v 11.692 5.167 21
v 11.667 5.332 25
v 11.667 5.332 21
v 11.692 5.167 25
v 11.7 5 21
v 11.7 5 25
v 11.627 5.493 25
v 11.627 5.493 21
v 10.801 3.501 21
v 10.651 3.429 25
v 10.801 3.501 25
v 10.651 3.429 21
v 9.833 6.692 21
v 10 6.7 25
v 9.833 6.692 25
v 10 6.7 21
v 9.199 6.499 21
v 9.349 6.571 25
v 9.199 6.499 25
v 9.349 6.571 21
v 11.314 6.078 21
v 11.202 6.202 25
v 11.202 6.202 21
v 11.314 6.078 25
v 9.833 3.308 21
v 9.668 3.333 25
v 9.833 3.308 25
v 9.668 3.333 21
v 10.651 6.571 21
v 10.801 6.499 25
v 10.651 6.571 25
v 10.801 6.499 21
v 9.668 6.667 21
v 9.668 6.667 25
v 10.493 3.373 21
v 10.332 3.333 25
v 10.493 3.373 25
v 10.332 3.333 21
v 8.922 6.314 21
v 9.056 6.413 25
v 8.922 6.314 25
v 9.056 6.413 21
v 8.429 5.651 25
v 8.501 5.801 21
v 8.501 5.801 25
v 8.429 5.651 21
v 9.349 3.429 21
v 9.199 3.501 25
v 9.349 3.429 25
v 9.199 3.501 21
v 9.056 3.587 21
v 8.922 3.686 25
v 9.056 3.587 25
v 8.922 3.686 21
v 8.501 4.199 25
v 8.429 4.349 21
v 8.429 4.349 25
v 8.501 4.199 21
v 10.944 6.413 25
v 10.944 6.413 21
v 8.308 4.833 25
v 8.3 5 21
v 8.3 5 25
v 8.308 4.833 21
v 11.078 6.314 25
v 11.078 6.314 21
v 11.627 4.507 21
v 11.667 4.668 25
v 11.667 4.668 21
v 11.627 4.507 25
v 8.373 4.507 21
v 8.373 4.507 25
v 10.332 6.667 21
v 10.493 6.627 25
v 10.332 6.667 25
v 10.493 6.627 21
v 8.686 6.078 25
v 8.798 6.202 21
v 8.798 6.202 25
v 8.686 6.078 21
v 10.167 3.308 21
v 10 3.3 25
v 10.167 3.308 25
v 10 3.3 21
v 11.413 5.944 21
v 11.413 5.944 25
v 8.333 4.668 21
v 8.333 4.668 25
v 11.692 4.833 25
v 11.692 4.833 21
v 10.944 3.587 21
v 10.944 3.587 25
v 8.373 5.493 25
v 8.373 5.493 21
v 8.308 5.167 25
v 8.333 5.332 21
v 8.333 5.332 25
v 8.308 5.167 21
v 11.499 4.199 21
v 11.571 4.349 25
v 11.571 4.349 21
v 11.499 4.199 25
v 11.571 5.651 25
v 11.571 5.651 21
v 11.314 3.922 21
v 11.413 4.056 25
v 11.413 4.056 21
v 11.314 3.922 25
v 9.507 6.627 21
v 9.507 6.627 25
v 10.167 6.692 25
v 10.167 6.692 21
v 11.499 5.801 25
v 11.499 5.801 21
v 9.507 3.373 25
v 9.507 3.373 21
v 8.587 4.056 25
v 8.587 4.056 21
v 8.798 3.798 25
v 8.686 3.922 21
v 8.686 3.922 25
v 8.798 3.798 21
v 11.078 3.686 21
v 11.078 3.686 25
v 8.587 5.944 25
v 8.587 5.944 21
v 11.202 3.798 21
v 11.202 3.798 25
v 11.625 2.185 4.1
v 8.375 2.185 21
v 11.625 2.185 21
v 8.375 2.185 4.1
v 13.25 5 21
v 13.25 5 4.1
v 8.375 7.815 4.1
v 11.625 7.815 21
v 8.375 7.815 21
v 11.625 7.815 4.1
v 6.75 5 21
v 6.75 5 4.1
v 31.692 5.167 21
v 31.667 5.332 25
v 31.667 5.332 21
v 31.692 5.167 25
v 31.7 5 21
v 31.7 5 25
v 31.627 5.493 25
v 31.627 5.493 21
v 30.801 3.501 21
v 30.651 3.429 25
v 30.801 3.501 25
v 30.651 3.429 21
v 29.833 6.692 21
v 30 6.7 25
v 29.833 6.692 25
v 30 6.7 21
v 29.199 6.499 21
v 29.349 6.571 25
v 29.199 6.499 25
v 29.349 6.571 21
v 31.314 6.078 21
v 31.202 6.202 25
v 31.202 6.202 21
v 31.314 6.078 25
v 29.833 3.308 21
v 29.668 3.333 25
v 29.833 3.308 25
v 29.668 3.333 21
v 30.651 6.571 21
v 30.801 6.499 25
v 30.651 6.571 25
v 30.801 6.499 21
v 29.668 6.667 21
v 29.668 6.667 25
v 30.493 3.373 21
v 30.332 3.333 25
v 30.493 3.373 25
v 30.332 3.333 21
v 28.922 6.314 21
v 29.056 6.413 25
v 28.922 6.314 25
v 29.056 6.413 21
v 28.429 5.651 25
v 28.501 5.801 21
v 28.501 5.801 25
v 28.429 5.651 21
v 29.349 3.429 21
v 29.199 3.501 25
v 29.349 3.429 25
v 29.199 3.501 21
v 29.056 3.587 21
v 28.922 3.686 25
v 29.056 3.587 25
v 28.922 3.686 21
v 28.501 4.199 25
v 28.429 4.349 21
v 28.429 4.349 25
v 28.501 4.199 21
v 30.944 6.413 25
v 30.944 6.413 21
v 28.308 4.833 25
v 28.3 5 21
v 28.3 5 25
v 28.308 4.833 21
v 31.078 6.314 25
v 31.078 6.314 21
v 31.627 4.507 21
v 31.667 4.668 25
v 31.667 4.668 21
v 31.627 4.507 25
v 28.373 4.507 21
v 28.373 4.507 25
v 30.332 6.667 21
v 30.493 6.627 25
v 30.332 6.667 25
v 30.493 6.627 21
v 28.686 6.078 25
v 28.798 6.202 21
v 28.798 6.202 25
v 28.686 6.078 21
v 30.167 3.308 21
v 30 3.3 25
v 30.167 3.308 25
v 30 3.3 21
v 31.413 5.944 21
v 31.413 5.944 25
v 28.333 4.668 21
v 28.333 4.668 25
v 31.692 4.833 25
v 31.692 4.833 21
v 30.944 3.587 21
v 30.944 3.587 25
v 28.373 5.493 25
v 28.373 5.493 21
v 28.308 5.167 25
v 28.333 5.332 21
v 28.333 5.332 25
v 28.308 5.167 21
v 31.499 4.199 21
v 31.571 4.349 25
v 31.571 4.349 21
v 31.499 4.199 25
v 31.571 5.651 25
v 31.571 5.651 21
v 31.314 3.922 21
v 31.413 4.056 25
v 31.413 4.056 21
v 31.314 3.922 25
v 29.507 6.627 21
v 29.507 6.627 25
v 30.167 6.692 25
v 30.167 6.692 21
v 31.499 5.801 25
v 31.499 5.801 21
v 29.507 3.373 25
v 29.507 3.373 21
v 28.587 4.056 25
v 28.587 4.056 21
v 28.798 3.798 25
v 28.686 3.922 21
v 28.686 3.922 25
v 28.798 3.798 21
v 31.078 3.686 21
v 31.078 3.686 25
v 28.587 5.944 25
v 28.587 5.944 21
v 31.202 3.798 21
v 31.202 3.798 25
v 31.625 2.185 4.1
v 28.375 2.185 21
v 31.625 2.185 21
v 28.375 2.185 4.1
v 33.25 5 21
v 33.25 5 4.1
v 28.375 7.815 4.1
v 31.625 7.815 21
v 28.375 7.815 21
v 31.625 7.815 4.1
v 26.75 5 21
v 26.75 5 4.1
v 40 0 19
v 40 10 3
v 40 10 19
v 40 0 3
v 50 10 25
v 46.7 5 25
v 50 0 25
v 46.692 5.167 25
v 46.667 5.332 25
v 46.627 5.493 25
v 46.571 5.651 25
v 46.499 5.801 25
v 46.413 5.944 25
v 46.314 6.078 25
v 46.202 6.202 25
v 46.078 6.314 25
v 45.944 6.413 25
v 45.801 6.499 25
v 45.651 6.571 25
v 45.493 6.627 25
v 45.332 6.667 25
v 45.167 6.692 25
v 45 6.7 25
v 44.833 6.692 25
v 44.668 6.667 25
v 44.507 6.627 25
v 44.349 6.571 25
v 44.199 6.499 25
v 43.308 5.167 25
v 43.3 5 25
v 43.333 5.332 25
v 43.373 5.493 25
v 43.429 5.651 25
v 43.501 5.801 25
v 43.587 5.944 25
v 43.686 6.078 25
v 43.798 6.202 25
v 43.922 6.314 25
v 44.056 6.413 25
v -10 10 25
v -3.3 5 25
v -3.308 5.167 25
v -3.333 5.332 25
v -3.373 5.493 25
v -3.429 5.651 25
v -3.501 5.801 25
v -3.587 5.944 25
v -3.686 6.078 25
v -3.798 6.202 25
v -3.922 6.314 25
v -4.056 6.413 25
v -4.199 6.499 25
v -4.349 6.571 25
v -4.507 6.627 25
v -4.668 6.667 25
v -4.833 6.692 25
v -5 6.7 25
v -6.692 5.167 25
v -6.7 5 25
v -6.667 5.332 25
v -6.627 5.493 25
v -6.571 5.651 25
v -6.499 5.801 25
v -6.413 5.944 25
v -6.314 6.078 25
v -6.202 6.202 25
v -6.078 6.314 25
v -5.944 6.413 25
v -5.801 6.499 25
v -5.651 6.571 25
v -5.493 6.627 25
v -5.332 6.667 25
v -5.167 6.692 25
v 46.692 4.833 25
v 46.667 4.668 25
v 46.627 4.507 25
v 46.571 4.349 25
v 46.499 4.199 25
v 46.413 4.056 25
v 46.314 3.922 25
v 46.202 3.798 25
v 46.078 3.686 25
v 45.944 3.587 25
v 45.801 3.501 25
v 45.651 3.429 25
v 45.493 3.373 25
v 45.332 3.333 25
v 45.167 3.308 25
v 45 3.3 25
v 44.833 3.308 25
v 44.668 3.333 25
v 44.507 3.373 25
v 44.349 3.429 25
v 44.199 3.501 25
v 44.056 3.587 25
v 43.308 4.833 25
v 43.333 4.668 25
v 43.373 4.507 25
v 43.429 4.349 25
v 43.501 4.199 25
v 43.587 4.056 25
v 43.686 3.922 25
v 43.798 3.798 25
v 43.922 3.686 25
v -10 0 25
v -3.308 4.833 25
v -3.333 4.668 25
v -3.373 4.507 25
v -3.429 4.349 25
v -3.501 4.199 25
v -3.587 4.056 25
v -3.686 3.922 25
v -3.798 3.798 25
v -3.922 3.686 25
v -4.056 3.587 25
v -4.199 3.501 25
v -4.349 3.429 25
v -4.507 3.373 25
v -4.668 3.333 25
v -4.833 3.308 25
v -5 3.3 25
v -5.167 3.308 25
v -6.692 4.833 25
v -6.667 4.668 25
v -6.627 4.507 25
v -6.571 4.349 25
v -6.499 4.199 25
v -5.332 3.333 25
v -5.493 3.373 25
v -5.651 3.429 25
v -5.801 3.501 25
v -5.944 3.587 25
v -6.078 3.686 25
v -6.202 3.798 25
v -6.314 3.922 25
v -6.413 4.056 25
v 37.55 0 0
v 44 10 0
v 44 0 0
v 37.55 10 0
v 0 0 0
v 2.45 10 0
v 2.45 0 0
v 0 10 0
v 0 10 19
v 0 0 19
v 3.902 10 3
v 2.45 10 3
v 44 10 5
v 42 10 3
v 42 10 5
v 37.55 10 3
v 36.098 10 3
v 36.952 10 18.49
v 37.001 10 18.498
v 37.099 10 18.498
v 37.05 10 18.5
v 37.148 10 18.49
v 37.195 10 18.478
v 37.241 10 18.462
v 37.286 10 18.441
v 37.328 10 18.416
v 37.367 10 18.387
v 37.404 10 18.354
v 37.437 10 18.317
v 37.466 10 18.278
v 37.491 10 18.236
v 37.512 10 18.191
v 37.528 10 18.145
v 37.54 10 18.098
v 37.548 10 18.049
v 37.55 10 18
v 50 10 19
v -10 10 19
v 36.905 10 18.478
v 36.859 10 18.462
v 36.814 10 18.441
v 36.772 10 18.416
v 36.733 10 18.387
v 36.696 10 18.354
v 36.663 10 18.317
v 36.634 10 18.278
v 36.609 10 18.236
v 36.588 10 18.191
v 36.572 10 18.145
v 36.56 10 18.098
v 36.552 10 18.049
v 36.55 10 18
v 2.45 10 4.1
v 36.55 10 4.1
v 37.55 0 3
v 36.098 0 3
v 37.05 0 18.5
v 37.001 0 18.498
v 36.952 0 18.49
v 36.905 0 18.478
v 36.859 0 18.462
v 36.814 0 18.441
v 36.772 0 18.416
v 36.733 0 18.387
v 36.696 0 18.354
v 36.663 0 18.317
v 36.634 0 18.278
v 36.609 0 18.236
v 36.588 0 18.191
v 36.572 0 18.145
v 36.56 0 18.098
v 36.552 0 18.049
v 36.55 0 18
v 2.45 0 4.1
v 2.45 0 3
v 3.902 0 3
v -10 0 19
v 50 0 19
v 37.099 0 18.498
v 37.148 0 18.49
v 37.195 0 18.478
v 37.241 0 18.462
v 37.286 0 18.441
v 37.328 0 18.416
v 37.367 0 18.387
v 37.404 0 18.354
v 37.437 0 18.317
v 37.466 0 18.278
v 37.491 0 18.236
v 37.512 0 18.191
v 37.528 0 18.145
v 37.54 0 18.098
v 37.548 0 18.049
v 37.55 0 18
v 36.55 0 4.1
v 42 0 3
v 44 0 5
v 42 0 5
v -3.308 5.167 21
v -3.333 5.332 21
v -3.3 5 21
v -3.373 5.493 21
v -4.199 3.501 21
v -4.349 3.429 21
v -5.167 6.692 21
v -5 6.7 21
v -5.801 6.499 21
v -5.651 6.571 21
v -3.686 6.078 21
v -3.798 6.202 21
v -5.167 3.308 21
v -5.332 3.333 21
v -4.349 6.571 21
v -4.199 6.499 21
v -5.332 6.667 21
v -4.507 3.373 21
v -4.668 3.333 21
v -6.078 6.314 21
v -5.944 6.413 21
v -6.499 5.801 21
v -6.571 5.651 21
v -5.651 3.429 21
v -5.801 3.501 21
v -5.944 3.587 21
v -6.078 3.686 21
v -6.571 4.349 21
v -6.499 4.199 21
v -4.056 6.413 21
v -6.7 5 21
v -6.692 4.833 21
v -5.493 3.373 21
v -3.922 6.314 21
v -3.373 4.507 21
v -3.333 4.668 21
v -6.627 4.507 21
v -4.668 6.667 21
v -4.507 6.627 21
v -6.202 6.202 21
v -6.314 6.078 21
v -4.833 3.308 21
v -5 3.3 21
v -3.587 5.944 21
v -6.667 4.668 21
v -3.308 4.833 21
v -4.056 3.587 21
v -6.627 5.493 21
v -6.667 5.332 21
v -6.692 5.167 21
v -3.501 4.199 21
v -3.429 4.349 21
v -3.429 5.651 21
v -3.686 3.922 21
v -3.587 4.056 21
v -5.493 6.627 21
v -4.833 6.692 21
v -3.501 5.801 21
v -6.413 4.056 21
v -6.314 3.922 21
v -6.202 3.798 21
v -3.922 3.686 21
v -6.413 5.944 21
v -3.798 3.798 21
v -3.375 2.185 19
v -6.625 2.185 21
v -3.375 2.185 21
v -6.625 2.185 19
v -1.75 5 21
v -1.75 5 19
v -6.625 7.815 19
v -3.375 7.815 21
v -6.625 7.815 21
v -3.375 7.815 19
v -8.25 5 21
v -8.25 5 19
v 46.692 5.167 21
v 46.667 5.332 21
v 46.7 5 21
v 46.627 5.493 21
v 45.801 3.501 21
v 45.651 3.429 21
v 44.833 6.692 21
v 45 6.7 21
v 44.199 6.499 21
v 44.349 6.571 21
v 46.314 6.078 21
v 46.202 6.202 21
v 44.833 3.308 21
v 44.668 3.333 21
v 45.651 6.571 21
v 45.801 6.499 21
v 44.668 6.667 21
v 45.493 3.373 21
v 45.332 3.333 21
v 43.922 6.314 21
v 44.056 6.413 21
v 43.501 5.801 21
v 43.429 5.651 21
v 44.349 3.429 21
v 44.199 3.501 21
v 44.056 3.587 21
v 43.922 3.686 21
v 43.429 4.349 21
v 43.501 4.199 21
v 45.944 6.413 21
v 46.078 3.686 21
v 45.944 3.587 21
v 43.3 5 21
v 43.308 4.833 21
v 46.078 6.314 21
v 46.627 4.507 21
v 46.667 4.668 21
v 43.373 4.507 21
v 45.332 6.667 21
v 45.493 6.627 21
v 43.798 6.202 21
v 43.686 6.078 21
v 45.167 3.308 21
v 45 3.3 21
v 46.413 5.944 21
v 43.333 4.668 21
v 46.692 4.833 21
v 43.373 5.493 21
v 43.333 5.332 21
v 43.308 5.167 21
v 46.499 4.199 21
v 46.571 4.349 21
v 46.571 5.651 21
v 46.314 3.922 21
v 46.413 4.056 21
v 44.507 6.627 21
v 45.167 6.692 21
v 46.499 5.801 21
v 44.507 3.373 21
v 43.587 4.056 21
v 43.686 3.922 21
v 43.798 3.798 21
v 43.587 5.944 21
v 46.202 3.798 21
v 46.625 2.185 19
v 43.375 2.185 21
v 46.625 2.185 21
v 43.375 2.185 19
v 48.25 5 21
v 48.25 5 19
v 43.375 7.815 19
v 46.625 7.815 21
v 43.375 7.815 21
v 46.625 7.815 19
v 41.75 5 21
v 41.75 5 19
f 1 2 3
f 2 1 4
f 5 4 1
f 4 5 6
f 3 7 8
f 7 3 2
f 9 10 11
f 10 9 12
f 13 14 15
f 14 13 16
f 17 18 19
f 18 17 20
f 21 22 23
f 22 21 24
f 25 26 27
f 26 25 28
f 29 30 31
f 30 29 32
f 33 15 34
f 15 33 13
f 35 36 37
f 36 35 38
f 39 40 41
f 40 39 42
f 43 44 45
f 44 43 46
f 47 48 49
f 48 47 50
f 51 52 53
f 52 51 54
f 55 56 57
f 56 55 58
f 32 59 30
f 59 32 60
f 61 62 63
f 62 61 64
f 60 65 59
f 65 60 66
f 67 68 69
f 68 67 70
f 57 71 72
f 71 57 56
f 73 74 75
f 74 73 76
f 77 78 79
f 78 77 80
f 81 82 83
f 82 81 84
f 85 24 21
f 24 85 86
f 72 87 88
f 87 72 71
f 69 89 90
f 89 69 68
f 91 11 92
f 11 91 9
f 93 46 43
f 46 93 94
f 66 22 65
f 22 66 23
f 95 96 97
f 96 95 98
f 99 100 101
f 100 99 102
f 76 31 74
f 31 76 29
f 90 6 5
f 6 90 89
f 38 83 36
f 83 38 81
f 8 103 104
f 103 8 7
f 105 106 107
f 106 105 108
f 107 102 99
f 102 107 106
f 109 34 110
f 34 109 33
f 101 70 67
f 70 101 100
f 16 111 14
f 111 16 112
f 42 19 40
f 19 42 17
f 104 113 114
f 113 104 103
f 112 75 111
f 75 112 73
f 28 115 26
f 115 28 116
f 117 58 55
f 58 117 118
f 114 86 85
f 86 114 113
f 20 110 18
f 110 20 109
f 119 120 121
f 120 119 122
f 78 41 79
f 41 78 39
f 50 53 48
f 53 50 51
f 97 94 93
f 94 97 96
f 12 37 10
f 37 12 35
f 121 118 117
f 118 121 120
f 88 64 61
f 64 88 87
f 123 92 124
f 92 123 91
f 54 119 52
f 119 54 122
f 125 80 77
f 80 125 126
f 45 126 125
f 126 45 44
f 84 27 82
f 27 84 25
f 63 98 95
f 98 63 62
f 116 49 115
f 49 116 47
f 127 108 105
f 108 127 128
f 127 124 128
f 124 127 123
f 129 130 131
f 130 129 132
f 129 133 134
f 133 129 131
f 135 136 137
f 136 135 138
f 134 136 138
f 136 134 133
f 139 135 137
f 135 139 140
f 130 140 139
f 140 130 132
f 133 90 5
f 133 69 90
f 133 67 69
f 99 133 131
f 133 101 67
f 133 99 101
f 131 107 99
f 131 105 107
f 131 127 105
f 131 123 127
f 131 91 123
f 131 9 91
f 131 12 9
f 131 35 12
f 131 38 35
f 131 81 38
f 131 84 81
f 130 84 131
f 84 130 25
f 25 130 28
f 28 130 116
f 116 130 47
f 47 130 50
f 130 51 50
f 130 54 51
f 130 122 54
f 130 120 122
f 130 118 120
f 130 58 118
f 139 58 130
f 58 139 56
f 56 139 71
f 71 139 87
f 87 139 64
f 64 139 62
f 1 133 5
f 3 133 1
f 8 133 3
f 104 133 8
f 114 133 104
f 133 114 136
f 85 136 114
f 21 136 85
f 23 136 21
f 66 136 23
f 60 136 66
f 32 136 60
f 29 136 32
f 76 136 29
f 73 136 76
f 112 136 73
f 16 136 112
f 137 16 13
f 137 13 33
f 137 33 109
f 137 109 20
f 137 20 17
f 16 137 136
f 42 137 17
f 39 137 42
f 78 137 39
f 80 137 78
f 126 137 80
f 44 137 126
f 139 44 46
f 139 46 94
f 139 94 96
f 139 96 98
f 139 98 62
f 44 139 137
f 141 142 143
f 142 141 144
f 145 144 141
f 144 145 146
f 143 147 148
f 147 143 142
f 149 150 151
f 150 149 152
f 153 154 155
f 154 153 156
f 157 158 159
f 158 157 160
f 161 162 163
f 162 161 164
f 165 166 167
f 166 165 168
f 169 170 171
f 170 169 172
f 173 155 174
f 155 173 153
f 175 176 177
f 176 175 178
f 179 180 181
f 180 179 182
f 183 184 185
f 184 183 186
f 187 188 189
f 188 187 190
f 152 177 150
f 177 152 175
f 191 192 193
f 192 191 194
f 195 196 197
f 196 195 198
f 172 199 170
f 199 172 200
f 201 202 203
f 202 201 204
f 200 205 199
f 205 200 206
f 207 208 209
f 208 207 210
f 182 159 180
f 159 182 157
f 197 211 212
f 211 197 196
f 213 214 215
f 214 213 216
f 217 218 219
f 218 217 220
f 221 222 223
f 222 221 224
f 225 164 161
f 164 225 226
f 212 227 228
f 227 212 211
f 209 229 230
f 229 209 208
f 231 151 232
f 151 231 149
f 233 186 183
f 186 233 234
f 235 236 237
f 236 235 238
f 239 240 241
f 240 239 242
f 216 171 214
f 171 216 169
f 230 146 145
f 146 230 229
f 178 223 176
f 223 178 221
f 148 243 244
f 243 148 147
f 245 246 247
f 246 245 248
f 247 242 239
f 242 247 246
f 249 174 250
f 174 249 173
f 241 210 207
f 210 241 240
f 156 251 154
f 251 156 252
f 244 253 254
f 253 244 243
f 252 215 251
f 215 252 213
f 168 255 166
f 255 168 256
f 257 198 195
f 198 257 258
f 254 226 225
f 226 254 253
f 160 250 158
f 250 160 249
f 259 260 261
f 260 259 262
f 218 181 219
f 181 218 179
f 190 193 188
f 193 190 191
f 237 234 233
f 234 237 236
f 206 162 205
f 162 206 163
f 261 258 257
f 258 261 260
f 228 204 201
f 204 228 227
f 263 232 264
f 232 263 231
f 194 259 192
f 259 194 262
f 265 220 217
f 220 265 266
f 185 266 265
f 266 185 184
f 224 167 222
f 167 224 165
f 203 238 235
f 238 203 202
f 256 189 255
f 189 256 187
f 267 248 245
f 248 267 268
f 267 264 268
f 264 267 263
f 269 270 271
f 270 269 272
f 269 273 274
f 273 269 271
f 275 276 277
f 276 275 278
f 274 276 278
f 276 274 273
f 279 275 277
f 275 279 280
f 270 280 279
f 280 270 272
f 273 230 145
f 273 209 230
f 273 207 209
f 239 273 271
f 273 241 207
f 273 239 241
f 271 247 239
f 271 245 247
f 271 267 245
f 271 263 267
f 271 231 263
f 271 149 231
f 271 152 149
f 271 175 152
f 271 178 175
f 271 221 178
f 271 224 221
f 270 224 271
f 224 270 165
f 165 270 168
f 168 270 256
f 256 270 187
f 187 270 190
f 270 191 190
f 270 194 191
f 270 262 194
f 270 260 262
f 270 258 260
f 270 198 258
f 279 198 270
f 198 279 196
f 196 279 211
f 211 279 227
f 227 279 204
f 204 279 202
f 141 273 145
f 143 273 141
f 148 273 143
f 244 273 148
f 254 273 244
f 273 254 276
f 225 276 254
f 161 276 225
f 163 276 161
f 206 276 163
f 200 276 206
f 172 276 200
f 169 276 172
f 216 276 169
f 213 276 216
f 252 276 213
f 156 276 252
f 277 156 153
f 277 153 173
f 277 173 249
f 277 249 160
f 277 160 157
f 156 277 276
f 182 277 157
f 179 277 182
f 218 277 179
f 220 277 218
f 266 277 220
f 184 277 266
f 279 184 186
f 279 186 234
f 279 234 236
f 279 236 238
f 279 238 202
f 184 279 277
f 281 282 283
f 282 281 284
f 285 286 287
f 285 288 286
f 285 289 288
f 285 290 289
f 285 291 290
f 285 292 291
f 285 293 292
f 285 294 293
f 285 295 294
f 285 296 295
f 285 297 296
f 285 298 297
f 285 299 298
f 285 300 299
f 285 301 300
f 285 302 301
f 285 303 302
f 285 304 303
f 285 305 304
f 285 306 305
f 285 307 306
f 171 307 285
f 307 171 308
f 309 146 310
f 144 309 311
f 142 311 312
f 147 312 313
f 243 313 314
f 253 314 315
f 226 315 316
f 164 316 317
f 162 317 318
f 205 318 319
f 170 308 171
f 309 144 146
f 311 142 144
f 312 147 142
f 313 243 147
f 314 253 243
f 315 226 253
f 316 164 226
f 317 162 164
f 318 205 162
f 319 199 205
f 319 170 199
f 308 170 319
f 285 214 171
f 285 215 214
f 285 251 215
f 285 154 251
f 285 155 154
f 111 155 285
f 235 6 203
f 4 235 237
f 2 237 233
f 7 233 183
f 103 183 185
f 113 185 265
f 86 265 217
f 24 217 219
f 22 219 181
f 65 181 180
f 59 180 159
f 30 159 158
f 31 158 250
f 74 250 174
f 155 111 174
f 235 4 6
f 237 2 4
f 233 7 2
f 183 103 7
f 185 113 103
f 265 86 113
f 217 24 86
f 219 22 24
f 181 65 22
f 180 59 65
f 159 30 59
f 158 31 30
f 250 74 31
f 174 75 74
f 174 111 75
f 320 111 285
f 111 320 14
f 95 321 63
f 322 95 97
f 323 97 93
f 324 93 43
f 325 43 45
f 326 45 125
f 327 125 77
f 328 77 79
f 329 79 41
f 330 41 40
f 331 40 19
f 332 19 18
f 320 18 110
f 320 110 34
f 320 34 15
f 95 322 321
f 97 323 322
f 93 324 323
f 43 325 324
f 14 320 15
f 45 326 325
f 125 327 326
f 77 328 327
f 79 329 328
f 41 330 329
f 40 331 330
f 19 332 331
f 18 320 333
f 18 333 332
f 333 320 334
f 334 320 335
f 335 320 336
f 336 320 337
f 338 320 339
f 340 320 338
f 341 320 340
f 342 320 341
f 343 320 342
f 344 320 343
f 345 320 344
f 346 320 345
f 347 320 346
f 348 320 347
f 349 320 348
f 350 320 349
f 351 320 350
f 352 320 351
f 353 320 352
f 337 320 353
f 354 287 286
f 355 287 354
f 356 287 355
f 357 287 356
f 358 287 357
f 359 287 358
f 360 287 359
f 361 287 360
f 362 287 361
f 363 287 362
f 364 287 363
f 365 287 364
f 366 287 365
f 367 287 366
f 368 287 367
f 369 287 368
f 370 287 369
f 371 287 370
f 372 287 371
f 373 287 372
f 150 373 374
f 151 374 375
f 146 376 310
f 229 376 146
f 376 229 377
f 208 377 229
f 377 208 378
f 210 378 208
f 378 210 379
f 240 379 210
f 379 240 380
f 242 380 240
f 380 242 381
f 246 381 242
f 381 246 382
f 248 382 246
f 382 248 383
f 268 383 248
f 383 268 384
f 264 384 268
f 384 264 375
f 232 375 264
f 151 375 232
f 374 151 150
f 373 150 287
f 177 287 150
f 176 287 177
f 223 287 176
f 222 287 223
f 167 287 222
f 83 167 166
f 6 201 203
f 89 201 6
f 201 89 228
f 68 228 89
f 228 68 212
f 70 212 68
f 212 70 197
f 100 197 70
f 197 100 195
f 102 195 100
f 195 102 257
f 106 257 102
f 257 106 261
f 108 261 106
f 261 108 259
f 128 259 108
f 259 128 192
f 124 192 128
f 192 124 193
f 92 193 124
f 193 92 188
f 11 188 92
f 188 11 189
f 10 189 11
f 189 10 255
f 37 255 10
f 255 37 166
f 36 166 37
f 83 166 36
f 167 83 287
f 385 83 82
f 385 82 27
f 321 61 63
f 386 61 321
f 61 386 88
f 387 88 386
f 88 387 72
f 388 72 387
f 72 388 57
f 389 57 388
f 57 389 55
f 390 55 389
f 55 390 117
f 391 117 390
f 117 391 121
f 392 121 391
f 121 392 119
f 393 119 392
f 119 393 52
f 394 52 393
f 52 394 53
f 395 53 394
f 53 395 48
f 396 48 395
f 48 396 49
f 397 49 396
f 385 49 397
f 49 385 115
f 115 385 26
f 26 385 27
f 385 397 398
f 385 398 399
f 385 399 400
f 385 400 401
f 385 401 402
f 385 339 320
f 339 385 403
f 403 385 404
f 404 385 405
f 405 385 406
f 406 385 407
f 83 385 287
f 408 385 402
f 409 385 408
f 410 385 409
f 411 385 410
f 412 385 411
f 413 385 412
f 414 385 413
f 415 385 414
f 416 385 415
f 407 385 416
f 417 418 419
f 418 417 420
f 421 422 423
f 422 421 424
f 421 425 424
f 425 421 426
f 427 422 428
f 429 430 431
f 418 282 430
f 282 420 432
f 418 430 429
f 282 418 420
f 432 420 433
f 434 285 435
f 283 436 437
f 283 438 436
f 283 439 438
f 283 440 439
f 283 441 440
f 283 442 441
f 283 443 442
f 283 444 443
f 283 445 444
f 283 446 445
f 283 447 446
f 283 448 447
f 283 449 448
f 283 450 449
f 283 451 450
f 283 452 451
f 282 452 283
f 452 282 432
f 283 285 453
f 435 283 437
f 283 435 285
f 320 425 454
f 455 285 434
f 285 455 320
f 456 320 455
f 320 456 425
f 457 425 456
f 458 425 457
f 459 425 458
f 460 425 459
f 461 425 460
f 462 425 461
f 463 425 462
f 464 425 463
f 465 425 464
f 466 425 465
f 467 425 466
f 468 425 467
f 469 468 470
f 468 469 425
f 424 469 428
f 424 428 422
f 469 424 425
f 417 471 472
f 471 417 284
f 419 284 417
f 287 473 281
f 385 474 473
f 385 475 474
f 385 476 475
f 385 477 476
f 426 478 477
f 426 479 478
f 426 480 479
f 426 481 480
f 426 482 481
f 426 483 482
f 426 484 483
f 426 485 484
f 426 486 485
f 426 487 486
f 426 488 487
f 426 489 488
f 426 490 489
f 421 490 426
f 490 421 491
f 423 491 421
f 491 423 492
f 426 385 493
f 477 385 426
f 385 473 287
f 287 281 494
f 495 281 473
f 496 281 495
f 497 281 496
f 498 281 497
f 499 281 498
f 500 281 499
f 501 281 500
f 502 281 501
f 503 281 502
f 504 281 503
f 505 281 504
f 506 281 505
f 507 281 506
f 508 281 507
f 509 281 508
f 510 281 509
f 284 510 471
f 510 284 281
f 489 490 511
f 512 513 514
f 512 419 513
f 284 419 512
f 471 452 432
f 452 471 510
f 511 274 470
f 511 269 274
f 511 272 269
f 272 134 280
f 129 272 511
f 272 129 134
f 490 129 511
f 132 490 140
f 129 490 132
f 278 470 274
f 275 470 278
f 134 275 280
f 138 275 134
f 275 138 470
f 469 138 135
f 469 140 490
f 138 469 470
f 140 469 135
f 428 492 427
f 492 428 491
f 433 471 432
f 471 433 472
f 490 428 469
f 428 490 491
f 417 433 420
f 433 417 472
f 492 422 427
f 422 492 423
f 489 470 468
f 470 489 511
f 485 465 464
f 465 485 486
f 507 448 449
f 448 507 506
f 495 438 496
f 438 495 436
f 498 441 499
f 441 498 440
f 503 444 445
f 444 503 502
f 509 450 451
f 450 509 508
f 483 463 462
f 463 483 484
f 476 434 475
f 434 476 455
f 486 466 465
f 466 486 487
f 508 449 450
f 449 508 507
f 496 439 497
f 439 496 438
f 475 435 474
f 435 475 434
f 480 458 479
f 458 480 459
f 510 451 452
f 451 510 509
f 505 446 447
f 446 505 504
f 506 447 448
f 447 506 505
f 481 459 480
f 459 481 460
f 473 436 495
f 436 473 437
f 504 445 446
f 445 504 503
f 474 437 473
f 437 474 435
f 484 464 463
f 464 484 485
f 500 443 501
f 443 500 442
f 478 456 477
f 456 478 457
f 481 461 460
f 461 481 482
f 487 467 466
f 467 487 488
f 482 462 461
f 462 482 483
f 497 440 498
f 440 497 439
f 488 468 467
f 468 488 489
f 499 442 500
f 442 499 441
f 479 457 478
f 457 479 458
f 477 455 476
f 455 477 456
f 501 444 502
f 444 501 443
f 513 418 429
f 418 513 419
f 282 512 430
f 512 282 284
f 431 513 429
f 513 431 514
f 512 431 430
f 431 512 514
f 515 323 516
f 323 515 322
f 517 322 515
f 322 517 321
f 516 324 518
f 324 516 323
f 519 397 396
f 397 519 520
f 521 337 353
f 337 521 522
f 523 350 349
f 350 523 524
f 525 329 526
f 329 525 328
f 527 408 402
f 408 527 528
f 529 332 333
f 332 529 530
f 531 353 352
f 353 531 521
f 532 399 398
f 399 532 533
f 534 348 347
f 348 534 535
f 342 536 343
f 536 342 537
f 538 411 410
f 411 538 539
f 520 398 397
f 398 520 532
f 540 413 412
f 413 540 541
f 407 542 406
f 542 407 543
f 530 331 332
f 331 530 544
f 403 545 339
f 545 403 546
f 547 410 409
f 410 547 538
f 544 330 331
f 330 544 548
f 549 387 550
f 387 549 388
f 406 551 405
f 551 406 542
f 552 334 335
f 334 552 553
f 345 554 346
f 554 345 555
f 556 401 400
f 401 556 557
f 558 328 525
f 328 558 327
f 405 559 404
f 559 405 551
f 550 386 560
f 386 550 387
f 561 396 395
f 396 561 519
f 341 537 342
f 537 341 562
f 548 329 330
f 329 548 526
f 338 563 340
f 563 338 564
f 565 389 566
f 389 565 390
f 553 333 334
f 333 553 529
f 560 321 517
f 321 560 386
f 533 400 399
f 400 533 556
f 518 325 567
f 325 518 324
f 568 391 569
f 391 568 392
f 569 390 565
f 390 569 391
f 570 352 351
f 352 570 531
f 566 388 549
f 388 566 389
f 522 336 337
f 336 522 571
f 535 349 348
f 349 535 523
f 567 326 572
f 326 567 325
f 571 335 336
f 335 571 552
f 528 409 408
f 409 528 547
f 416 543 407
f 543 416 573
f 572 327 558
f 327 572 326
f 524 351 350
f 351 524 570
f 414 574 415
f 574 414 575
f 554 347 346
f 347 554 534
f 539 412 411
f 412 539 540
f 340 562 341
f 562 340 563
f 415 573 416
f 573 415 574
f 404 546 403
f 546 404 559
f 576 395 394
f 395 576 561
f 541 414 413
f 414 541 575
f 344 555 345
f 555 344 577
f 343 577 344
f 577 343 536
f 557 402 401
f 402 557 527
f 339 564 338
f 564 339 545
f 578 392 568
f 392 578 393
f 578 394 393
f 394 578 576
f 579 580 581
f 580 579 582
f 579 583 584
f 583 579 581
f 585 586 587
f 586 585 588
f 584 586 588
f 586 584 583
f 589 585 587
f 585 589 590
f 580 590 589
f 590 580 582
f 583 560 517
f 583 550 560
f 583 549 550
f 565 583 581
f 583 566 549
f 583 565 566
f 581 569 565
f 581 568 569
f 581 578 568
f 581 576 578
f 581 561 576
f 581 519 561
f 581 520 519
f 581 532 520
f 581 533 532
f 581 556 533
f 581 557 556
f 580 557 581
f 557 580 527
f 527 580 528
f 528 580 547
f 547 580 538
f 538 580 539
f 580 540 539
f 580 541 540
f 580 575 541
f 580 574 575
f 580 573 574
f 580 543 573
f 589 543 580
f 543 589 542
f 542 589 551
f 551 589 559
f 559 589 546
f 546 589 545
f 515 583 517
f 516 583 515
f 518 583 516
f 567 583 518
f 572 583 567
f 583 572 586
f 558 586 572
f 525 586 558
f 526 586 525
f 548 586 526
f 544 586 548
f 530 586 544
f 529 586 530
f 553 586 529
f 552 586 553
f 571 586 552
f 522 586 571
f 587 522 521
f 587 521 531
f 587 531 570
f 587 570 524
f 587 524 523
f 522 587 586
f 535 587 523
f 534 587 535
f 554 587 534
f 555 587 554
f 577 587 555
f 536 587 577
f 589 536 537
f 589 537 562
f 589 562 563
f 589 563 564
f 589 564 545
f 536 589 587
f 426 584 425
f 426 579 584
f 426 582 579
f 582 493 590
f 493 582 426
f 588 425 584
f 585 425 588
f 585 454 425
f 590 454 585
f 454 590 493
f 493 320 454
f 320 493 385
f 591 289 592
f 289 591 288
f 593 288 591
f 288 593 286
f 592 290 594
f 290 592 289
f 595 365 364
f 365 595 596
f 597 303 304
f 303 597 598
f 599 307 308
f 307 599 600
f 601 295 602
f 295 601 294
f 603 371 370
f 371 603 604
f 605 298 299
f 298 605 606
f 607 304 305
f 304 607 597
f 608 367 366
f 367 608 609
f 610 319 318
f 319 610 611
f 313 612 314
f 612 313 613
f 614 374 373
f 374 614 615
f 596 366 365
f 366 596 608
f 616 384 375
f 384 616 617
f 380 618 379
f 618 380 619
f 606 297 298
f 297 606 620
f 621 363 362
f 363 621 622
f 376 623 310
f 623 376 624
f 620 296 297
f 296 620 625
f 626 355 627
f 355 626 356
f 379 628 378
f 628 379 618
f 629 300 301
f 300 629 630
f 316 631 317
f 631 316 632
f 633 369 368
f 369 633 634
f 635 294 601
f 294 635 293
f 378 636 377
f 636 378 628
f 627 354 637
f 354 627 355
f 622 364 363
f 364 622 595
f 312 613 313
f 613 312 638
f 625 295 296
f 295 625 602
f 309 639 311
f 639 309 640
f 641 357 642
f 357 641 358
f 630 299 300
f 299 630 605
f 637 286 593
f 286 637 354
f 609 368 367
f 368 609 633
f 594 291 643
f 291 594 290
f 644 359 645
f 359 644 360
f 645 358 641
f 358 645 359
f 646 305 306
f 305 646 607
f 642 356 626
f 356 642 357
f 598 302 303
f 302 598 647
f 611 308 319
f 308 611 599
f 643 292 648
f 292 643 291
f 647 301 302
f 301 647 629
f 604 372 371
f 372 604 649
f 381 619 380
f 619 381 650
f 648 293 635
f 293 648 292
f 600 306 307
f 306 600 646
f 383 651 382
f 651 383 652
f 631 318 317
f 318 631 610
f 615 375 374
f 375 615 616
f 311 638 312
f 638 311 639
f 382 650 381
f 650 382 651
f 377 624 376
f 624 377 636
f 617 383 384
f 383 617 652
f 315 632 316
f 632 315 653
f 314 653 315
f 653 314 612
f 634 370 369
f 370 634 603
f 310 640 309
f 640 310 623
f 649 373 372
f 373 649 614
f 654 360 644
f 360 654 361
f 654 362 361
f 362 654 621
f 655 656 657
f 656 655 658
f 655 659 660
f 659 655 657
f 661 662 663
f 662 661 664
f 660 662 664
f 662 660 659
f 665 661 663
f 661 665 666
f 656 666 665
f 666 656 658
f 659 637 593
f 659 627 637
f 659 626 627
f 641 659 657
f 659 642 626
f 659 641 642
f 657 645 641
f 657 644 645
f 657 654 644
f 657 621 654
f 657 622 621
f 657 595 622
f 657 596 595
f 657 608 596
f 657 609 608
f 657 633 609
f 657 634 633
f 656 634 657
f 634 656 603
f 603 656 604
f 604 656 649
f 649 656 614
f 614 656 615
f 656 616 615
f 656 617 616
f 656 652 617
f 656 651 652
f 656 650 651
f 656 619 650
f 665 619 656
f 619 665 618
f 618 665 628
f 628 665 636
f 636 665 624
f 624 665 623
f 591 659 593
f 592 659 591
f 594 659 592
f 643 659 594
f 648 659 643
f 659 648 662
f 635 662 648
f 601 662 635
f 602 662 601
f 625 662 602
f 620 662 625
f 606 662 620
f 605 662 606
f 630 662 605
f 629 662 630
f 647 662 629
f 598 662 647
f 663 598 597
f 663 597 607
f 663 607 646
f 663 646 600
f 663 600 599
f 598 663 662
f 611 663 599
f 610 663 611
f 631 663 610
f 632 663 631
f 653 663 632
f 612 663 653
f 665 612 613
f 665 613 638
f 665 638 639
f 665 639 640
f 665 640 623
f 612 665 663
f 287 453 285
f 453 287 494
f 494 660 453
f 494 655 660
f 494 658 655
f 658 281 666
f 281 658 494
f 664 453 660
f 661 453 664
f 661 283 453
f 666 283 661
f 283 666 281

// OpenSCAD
/*
 * DIN-liistu universaalne kinnitus
 * Versioon: 0.26
 */

// --- Baasparameetrid ---
rail_width = 34.9;      
rail_thick = 0.9;       
tolerance = 0.2;        

base_w = 40.0;          
base_d = 10.0;          
base_h = 25.0;          

dist_from_bottom = 3.0; 

// --- Vertikaalse pilu parameetrid ---
slit_width = 1.0;       
slit_length = 15.0;     

// --- Hamba parameetrid ---
hook_size = 3.0;        

// --- L-konksu (vabastushoova) parameetrid ---
lever_ext = 4.0;        
lever_h = 5.0;          
lever_wall_t = 2.0;     
lever_base_h = dist_from_bottom; 

// --- Kinnitusaukude ja mutrite parameetrid ---
screw_d = 3.4;          
nut_d = 6.5;            
nut_h = 3.0;            
dist_from_top = 4.0;    
screw_dist_from_center = 10.0; 

// --- Kinnituskõrvade parameetrid ---
enable_ears = true;     
ear_l = 10.0;           
ear_h = 6.0;            // Muudetud: Madalam profiil (6mm)

// --- Arvutatud väärtused ---
rail_x_center = base_w / 2;
rail_x_start = (base_w - (rail_width + tolerance)) / 2;
rail_x_end = rail_x_start + (rail_width + tolerance);
trap_top_width = (rail_width + tolerance) - hook_size;
trap_bot_width = (rail_width + tolerance);

$fn = 64;

module screw_and_nut(x, y, z_total_h) {
    translate([x, y, -1]) {
        cylinder(d = screw_d, h = z_total_h + 2);
        nut_pocket_h = max(0, z_total_h - dist_from_top + 1);
        cylinder(d = nut_d, h = nut_pocket_h, $fn=6);
    }
}

module din_mount() {
    union() {
        // 1. PÕHIKEHA
        difference() {
            cube([base_w, base_d, base_h]);

            translate([rail_x_start, -1, dist_from_bottom])
                cube([rail_width + tolerance, base_d + 2, rail_thick + tolerance]);

            translate([rail_x_center, -1, 0]) 
            hull() {
                translate([-trap_bot_width / 2, 0, -0.1]) cube([trap_bot_width, base_d + 2, 0.1]);
                translate([-trap_top_width / 2, 0, dist_from_bottom]) cube([trap_top_width, base_d + 2, 0.1]);
            }

            translate([rail_x_end - slit_width, -1, dist_from_bottom])
                cube([slit_width, base_d + 2, slit_length]);
            translate([rail_x_end - slit_width/2, -1, dist_from_bottom + slit_length])
                rotate([-90, 0, 0]) cylinder(d = slit_width, h = base_d + 2);

            for (x_offset = [-screw_dist_from_center, screw_dist_from_center]) {
                screw_and_nut(rail_x_center + x_offset, base_d / 2, base_h);
            }
        }

        // 2. L-KONKS
        translate([base_w, 0, 0]) {
            cube([lever_ext, base_d, lever_base_h]); 
            translate([lever_ext - lever_wall_t, 0, lever_base_h])
                cube([lever_wall_t, base_d, lever_h - lever_base_h]);
        }

        // 3. KINNITUSKÕRVAD
        if (enable_ears) {
            difference() {
                translate([-ear_l, 0, base_h - ear_h]) cube([ear_l, base_d, ear_h]);
                screw_and_nut(-ear_l/2, base_d/2, base_h);
            }
            difference() {
                translate([base_w, 0, base_h - ear_h]) cube([ear_l, base_d, ear_h]);
                screw_and_nut(base_w + ear_l/2, base_d/2, base_h);
            }
        }
    }
}

din_mount();
